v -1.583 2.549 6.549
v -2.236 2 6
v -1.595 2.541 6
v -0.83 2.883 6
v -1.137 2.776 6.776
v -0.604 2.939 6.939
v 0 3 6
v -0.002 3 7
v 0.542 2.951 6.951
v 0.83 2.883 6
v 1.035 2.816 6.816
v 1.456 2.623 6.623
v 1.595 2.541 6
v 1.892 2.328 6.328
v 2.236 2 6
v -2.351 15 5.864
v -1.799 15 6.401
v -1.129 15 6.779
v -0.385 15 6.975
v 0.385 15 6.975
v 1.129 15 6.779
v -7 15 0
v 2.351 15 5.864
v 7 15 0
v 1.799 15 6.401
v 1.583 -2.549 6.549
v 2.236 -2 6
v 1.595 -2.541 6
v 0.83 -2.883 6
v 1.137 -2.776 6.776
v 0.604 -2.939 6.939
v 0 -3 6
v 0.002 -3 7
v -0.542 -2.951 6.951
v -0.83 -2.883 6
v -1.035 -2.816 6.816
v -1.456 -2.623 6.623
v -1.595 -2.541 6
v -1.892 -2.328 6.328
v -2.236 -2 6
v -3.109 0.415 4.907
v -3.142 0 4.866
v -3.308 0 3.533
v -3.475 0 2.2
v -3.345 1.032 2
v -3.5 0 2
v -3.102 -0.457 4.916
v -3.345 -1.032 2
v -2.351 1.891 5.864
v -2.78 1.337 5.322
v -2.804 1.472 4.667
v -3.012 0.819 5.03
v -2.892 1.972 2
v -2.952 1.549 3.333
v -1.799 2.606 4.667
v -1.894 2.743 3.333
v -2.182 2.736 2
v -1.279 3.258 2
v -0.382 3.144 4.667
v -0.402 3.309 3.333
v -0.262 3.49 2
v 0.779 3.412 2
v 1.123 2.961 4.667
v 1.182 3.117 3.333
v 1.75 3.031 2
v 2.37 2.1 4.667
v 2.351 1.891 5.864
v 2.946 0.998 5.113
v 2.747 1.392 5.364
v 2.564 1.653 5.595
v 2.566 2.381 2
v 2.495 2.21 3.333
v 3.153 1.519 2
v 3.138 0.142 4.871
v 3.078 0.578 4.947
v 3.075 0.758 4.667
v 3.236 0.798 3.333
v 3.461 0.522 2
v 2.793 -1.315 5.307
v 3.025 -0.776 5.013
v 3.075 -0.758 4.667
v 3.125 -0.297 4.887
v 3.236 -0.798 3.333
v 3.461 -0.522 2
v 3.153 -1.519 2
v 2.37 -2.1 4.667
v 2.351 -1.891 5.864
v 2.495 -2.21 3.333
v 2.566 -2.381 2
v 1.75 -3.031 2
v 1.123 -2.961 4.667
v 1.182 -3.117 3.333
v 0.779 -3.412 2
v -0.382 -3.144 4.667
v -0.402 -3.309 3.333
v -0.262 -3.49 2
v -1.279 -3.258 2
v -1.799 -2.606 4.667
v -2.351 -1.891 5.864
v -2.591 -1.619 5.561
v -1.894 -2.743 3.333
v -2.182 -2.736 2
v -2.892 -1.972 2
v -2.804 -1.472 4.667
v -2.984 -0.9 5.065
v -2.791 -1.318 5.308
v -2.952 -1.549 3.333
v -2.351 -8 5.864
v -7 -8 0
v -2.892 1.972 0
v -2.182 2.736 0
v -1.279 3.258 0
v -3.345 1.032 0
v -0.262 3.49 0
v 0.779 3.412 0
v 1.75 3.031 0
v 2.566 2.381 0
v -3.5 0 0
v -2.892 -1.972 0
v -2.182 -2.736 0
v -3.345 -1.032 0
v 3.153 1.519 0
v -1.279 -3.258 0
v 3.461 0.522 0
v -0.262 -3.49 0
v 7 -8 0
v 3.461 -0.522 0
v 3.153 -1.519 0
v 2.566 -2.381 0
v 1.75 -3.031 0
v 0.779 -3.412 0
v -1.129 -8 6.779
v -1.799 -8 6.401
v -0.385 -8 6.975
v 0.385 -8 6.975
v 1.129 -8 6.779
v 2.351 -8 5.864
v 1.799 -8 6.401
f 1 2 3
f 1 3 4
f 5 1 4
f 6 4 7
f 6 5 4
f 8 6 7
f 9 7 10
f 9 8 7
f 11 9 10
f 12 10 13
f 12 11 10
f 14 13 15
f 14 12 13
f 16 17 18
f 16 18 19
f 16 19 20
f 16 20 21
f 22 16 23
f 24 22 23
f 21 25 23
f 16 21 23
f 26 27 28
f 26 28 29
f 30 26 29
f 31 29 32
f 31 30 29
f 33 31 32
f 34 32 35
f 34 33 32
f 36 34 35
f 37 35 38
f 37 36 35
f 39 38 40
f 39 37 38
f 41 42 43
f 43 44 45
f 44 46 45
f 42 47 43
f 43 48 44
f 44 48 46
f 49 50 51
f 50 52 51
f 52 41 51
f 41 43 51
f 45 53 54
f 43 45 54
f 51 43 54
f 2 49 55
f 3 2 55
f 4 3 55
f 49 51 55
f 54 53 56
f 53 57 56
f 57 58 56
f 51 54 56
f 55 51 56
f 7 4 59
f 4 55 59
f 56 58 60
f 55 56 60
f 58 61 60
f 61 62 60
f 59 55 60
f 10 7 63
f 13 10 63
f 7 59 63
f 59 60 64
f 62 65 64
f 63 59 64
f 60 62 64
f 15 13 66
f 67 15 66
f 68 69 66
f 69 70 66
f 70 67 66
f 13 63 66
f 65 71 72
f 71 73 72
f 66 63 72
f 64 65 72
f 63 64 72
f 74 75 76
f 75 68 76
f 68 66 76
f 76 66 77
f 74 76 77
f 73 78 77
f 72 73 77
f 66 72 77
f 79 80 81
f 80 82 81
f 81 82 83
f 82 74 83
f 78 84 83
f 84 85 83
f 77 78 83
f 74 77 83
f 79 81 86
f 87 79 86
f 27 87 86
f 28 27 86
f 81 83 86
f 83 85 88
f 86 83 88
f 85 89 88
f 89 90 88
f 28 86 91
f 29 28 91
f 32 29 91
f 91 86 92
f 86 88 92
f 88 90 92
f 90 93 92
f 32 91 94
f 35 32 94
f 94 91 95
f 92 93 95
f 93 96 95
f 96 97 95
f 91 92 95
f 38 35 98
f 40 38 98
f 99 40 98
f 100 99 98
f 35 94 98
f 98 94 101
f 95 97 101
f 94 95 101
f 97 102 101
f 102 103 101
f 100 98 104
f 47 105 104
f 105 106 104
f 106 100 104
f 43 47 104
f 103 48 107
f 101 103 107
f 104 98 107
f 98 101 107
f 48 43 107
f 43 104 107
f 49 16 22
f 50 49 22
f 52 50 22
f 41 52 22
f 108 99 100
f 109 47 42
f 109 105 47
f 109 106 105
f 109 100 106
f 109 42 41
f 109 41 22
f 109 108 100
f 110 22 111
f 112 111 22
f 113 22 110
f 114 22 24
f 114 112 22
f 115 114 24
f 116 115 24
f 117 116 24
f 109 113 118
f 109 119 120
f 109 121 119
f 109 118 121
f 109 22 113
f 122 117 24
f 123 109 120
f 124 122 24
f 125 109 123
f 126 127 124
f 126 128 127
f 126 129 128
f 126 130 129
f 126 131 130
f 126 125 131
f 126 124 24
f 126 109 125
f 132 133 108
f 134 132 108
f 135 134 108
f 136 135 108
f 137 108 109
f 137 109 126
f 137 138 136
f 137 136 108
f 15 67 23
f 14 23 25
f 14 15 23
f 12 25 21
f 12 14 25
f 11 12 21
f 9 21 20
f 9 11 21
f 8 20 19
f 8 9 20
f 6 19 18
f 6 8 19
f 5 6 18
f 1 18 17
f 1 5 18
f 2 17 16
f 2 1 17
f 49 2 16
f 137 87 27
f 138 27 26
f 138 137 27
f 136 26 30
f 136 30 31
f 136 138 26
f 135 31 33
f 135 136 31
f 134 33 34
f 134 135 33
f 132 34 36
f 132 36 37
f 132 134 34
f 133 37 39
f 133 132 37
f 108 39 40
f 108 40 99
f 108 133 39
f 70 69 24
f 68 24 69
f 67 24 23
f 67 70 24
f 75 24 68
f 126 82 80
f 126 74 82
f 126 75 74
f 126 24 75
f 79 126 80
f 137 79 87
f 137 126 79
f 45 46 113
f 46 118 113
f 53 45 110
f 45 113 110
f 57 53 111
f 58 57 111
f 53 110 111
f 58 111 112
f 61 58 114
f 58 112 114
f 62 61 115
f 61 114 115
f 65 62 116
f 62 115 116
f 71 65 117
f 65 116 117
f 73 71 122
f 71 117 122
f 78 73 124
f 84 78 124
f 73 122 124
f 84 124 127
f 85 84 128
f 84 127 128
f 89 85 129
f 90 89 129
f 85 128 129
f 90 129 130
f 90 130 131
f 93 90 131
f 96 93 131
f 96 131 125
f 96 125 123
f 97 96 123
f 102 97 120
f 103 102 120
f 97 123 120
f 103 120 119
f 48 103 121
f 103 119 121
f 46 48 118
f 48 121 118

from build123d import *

# Parameters (mm, degrees)
F1_DEPTH      = 8
F1_DEPTH_BACK = 15
F2_W          = 3
F2_H          = 2


with BuildPart() as f1:
    # F0 (on Front) → F1 (new body, two sides)
    with BuildSketch(Plane.XZ) as f1_sk:
        with BuildLine():
            Line((-2.350766, 5.86384), (-7, 0))
            Line((-7, 0), (7, 0))
            Line((7, 0), (2.350766, 5.86384))
            ThreePointArc((2.350766, 5.86384), (0, 7), (-2.350766, 5.86384))
        make_face()
    extrude(amount=F1_DEPTH)
    extrude(f1_sk.sketch, amount=-F1_DEPTH_BACK)

    # F2 (on Front) → F3 (revolve, cut)
    with BuildSketch(Plane.XZ):
        Polygon((-3, 6), (-3.5, 2), (-3.5, 0), (0, 0), (0, 6), align=None)
        with Locations((-1.5, 7)):
            Rectangle(F2_W, F2_H)
    revolve(axis=Axis((0, 0, 4.448359), (0, 0, -1)), mode=Mode.SUBTRACT)


solid = f1.part
